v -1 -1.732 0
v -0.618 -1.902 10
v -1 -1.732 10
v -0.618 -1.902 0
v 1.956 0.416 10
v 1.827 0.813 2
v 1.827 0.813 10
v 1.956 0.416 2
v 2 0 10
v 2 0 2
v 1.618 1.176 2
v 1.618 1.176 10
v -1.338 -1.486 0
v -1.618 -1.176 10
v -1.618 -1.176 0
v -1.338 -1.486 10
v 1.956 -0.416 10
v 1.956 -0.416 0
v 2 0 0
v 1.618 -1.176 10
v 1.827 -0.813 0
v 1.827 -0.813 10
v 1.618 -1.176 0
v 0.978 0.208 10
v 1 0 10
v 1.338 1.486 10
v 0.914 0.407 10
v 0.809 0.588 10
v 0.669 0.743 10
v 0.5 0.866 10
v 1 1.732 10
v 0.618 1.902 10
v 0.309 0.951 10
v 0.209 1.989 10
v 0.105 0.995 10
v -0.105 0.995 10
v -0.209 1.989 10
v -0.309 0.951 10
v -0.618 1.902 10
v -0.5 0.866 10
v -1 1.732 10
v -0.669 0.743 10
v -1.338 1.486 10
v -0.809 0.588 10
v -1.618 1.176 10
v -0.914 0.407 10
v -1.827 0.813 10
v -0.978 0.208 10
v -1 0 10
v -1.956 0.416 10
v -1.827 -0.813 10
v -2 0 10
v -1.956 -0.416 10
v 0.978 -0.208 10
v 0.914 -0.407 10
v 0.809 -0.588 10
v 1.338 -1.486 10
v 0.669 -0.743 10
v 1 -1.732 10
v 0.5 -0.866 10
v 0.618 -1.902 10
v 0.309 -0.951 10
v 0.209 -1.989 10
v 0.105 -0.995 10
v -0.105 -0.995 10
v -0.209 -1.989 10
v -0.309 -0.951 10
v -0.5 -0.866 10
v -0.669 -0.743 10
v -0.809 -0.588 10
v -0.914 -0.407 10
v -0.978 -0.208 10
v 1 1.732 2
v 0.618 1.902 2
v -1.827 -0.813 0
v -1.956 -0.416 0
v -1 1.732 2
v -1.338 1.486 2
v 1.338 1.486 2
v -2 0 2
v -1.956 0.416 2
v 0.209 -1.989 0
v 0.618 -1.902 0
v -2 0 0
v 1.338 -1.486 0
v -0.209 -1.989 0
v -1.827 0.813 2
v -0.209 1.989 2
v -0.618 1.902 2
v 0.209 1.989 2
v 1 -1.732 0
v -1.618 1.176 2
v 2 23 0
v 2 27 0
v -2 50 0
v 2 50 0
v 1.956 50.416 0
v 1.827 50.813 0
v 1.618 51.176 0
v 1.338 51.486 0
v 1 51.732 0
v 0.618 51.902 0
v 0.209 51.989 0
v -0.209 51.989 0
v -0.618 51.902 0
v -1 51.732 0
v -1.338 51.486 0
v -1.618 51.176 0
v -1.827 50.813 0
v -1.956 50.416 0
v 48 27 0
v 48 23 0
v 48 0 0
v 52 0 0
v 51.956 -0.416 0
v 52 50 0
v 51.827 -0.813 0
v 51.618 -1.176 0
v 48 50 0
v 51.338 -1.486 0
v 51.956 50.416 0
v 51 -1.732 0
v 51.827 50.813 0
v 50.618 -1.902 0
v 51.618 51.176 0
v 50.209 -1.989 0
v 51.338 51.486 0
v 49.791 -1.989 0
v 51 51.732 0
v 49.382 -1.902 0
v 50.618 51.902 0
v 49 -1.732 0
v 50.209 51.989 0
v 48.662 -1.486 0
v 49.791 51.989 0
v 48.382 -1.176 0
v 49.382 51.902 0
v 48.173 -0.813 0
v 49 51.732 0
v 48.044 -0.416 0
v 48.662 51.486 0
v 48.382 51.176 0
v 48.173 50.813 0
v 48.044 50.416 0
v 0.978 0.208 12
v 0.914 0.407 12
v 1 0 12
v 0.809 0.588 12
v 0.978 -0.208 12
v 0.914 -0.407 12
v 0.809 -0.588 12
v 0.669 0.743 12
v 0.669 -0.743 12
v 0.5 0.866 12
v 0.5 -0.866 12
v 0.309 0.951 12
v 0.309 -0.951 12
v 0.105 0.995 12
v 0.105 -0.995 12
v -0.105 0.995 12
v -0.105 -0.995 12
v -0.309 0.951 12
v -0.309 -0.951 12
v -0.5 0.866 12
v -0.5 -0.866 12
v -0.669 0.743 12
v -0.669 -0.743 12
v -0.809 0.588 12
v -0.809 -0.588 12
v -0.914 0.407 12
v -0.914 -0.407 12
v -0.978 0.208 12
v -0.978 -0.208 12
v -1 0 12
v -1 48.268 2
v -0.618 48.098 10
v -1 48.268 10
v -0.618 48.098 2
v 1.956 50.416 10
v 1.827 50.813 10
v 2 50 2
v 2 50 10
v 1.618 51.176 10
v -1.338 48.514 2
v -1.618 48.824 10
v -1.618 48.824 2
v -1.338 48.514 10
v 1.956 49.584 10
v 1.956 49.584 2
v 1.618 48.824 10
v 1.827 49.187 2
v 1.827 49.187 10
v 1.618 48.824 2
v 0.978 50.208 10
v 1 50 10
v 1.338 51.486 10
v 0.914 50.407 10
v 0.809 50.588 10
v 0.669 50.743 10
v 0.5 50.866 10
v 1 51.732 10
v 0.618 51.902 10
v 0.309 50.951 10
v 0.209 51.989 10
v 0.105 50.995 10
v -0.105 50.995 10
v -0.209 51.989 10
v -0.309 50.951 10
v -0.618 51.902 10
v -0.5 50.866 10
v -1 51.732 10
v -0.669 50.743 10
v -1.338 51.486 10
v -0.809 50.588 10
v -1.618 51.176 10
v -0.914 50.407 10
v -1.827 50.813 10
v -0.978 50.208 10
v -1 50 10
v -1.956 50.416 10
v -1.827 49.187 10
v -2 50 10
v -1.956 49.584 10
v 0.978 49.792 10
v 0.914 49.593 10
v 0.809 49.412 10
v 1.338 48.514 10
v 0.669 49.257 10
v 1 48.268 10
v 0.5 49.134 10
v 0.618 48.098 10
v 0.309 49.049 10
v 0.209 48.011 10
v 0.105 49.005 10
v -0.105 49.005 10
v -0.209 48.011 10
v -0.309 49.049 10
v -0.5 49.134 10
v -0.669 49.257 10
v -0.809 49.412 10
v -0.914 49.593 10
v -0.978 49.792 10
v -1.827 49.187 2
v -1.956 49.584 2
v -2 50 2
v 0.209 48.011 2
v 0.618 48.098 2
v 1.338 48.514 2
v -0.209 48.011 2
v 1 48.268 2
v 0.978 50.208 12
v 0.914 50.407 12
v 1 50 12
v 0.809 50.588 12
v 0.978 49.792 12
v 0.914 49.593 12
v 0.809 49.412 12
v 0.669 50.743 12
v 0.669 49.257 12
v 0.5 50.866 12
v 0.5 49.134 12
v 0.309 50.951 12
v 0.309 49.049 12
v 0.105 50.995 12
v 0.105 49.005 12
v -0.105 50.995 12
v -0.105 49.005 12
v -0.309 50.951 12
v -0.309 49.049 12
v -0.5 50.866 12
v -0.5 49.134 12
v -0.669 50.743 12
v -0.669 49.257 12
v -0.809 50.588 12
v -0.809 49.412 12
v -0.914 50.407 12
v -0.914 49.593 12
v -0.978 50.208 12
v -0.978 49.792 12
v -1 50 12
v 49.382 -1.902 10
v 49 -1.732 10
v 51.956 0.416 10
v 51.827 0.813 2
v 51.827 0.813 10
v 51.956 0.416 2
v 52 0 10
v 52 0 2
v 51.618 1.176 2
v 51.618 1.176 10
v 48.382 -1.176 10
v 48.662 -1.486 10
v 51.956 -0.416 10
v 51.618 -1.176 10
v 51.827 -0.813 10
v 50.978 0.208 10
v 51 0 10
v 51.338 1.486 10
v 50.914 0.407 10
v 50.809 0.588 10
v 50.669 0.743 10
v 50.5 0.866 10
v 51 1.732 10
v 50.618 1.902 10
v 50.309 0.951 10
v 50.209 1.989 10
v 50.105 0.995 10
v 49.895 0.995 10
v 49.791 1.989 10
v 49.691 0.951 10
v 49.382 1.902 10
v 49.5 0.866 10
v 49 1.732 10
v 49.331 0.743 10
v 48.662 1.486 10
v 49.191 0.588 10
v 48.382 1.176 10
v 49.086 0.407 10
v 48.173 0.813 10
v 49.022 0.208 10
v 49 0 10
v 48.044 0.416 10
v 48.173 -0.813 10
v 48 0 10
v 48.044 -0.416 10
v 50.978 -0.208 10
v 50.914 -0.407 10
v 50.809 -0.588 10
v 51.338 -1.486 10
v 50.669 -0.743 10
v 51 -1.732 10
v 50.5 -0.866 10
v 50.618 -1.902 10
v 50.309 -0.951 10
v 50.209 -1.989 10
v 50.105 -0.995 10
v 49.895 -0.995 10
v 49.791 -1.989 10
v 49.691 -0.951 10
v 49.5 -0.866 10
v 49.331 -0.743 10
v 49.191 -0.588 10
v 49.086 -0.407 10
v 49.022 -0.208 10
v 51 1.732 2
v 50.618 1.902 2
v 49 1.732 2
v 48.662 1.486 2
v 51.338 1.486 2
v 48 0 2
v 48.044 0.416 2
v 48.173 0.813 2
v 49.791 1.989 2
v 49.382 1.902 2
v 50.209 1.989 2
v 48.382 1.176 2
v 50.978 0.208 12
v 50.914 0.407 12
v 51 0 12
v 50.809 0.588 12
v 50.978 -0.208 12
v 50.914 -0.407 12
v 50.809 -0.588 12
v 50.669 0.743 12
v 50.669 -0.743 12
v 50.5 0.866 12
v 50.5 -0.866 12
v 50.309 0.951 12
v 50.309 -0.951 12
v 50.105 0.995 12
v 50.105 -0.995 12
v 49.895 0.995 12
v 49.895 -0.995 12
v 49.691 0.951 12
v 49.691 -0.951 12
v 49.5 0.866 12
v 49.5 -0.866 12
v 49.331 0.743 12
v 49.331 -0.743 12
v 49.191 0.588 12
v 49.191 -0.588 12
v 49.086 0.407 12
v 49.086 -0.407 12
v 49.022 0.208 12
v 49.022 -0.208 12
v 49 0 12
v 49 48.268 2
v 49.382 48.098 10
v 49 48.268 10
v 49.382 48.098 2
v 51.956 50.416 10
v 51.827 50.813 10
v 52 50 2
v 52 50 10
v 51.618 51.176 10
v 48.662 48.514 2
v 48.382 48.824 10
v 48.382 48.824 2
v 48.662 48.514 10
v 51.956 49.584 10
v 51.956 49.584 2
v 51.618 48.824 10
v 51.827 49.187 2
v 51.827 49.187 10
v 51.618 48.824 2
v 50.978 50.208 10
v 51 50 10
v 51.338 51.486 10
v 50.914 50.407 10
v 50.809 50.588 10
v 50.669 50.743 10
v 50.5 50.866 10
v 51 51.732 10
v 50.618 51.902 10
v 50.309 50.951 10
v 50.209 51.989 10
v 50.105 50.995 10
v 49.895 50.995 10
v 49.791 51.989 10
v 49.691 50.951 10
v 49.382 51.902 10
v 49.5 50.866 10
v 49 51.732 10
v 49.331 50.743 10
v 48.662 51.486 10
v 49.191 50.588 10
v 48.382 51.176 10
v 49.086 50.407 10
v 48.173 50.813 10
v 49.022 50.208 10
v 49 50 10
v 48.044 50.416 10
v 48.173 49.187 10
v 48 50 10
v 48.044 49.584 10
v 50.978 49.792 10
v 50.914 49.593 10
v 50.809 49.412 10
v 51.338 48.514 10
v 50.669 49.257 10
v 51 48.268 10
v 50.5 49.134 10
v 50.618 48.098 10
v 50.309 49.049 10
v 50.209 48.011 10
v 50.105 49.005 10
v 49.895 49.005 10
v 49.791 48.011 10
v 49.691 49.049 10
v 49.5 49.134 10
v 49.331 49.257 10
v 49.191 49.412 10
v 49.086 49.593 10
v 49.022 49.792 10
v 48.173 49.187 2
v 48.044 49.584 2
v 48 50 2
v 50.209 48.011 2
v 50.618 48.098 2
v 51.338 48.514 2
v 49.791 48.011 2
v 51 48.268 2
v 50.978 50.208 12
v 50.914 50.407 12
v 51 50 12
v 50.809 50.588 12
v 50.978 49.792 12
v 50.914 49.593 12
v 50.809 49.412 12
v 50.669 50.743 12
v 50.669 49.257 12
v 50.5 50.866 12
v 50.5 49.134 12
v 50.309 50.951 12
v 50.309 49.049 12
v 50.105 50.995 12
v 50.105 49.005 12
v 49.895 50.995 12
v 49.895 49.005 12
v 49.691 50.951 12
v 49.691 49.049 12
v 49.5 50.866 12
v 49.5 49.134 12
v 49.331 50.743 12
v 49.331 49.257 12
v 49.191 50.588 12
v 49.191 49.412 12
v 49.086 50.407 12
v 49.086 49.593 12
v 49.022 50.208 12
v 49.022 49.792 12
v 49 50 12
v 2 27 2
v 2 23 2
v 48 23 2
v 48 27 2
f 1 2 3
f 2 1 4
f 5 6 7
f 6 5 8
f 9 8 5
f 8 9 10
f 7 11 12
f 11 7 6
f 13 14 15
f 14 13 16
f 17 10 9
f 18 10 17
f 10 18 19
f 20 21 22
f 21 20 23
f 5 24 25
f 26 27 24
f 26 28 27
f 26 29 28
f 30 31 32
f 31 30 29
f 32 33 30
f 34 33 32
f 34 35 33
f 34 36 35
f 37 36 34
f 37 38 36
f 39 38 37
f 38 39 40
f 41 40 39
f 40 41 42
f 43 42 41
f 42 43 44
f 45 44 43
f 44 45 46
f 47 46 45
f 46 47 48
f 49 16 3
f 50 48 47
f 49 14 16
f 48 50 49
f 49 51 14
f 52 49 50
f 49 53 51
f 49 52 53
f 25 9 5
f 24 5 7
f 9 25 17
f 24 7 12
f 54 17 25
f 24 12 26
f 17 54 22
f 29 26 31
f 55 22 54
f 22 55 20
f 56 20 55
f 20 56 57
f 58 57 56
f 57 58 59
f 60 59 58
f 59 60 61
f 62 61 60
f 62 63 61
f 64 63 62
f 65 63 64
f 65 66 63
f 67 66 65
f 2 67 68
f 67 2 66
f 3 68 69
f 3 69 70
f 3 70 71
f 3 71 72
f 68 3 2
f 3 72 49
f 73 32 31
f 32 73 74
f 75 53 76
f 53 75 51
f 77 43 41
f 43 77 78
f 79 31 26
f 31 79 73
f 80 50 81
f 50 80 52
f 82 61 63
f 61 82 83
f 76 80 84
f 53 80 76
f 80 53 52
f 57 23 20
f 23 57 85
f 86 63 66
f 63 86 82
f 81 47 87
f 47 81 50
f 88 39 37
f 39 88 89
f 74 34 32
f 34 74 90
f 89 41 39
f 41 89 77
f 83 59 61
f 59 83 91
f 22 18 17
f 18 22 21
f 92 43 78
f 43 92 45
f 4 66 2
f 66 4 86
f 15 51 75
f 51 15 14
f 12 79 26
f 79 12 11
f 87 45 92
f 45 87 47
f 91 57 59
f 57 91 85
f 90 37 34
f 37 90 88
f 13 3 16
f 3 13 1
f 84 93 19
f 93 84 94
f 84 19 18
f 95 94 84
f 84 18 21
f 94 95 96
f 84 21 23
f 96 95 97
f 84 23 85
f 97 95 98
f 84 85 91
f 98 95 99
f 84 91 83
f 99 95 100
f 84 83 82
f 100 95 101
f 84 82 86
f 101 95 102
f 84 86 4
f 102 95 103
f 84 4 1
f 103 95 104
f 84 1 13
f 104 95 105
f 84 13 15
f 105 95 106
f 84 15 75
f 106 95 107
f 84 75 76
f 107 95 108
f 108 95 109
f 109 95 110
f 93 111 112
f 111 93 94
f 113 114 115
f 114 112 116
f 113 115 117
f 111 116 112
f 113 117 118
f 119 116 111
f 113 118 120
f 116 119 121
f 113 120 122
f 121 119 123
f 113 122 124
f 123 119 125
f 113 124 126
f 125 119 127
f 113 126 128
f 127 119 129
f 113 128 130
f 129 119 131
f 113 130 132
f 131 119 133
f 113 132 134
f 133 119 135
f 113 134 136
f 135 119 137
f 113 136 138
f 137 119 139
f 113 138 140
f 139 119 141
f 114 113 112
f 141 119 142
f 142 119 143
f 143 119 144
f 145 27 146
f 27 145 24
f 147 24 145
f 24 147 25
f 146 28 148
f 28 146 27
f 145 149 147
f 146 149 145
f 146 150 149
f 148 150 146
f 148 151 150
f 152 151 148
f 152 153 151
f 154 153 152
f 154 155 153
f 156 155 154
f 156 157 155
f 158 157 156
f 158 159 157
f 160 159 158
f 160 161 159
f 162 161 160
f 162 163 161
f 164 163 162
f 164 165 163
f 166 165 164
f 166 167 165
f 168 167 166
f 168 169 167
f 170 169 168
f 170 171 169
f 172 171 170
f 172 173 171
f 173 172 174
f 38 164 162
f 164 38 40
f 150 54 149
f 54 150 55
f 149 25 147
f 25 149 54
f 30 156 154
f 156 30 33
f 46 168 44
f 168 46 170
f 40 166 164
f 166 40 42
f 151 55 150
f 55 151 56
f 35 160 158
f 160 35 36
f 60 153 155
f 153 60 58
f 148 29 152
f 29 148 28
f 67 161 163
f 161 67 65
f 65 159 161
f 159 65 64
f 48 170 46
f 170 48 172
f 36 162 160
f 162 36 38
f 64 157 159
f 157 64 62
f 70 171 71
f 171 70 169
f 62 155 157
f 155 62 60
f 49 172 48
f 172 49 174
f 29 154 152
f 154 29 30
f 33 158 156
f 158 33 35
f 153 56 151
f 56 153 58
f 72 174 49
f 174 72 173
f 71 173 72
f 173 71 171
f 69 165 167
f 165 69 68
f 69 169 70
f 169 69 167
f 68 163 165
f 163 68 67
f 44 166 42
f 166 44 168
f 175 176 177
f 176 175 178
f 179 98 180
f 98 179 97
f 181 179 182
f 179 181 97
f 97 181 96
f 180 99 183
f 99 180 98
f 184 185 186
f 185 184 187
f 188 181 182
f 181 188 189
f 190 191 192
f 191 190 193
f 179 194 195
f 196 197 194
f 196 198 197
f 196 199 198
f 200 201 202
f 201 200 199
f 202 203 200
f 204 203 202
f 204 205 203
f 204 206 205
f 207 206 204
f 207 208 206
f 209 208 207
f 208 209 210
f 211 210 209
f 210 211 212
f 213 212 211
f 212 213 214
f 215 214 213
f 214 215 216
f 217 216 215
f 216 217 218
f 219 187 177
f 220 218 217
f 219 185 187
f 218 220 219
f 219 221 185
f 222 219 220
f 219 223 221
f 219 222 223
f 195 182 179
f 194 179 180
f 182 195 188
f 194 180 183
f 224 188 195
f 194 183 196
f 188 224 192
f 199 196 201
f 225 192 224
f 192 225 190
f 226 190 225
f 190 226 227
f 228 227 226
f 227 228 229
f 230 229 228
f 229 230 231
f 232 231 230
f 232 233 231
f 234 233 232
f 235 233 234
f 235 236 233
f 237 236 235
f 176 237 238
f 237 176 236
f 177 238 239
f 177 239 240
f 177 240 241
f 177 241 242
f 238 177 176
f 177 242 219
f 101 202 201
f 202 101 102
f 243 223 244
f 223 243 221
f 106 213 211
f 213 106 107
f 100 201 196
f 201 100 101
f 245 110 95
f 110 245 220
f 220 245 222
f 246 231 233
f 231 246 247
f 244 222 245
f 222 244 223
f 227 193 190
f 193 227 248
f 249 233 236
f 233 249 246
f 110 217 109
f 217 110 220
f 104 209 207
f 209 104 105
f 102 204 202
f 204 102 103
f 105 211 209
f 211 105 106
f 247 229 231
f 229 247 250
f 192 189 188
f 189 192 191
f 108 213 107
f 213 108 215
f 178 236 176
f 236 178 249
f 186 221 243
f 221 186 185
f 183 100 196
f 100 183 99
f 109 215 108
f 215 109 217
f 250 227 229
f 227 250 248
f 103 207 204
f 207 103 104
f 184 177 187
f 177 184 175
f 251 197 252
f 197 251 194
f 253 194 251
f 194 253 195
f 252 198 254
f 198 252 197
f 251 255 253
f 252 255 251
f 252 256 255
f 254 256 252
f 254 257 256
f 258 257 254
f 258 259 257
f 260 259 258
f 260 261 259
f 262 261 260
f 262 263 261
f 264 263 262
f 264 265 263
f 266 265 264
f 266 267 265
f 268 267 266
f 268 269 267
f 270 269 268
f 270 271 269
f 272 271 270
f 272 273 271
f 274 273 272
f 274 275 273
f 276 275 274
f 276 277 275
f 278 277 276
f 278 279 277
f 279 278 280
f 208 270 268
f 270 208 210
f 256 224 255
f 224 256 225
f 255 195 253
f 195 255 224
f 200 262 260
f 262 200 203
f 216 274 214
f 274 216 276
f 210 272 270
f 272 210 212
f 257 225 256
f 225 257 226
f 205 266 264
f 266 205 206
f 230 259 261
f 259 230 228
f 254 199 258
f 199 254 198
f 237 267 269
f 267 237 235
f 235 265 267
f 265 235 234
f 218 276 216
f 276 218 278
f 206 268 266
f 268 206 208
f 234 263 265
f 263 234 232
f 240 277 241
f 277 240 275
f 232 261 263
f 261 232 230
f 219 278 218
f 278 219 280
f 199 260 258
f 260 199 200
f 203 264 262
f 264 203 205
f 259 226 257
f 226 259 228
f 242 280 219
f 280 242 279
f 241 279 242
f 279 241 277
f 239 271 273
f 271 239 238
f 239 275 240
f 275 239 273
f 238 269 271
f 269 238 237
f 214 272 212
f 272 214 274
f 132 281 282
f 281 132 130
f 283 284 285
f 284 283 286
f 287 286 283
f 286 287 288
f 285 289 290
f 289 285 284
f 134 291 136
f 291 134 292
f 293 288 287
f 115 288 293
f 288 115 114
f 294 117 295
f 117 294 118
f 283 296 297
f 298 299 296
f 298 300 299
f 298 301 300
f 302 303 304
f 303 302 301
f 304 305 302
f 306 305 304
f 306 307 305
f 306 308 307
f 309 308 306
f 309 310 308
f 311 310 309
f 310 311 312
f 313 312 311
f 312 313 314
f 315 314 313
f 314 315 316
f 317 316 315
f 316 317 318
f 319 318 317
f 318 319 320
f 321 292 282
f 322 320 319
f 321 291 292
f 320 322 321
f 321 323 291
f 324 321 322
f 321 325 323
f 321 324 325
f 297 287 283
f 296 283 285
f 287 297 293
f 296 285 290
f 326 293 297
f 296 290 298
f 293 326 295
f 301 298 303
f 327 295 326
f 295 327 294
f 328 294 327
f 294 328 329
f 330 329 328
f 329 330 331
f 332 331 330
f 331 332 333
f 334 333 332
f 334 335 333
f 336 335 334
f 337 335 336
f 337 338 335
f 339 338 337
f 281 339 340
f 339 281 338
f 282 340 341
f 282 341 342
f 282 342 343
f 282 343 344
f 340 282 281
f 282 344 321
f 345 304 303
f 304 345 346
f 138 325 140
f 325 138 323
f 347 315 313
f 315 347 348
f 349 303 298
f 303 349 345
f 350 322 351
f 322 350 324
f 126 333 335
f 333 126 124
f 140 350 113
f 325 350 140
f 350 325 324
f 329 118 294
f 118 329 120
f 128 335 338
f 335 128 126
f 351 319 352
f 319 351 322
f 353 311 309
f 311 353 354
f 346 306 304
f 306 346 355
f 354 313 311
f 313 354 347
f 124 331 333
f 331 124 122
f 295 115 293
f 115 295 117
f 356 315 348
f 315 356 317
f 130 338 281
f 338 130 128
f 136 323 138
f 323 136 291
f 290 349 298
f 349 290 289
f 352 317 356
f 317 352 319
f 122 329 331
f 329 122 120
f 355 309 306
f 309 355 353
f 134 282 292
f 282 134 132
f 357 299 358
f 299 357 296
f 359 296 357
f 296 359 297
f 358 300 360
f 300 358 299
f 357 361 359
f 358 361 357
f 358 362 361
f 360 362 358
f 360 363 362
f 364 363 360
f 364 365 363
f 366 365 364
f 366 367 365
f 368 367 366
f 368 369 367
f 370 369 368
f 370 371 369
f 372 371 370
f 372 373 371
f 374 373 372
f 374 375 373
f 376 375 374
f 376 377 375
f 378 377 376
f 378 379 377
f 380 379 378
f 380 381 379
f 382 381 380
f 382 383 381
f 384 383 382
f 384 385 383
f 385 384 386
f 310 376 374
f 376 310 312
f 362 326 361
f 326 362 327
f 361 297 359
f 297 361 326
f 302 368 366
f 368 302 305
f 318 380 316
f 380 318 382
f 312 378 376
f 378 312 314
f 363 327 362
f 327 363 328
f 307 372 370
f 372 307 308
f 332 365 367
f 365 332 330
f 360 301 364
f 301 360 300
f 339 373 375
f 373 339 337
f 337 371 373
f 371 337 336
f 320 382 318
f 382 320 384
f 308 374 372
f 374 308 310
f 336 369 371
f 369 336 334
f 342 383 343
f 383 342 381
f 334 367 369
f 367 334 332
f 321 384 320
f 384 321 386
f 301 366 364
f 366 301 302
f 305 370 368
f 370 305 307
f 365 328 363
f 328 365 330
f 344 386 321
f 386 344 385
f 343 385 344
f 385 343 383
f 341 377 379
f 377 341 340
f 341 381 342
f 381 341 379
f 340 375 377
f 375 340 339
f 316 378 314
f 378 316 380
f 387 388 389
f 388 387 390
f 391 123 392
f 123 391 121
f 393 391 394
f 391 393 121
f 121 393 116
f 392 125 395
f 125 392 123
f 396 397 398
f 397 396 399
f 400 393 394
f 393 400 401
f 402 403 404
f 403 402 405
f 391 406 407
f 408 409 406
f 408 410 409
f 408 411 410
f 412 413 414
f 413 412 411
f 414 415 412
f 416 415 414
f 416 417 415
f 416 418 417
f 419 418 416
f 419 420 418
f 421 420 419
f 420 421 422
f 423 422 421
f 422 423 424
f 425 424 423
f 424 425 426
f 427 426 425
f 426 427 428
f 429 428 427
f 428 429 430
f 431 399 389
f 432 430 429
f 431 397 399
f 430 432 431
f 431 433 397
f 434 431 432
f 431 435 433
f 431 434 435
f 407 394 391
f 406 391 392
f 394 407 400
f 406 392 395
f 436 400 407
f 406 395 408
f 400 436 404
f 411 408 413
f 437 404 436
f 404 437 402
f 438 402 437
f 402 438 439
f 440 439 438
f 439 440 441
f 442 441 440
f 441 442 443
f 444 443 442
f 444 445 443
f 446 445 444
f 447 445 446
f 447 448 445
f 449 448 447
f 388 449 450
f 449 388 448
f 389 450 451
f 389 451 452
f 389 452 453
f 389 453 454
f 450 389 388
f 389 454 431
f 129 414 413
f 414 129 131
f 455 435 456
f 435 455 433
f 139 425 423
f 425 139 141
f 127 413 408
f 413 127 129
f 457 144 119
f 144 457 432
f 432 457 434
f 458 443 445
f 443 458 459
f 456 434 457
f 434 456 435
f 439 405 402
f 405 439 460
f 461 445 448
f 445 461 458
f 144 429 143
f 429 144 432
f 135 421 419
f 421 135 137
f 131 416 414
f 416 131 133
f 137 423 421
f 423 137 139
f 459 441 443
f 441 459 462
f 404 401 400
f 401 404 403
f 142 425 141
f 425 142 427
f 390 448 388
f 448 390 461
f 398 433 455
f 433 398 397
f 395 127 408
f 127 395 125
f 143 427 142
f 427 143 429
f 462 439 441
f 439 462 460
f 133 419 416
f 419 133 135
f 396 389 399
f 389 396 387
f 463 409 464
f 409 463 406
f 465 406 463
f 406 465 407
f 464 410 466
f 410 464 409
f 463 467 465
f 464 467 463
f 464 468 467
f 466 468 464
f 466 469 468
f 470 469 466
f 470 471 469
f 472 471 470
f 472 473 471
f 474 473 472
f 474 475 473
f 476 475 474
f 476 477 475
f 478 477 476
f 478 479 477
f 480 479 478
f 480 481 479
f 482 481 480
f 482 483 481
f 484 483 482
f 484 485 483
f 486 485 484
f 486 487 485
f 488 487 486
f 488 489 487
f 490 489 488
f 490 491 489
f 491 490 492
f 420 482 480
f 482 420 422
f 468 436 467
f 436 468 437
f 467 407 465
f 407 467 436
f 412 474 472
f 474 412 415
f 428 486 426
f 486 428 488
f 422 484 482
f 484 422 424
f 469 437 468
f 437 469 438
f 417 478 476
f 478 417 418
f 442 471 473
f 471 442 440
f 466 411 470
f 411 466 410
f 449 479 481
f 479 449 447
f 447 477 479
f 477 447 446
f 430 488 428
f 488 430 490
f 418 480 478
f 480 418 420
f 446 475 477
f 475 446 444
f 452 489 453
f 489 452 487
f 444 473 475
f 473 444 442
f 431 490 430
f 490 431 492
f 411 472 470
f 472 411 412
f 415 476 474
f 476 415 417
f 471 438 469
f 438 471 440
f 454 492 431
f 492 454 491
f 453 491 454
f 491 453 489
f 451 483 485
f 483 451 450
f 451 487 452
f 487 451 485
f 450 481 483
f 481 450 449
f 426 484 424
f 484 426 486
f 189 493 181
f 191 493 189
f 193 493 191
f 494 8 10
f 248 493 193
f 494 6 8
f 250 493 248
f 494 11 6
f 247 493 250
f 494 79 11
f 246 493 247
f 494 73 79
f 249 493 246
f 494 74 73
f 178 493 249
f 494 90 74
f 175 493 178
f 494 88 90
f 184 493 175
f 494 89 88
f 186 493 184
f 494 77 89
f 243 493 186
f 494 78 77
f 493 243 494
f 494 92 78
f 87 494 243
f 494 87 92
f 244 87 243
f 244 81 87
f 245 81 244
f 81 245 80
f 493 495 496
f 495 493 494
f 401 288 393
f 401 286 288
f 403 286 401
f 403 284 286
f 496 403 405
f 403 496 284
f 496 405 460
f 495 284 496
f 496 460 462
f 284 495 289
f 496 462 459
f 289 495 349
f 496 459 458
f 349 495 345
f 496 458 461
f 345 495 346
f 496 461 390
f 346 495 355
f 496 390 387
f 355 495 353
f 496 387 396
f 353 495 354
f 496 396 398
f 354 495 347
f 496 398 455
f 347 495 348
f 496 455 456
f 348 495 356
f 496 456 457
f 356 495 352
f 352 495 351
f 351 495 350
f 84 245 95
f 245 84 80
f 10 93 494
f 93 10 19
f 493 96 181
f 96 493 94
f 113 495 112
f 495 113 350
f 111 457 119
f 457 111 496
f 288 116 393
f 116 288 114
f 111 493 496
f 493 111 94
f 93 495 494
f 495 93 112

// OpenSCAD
// file: common.scad
$fs = 0.1;

mm = 1;

intra_board_width = 50 * mm;
inter_board_width = 50 * mm;

link_width = 4 * mm;
link_height = 2 * mm;

standoff_width = 4 * mm;
standoff_height = 10 * mm;

peg_width = 2 * mm;
peg_height = 2 * mm;

total_height = standoff_height + peg_height;

module peg()
{
    cylinder(h = standoff_height, d = standoff_width);
    translate([ 0, 0, standoff_height ]) cylinder(h = peg_height, d = peg_width);
}

module link(length)
{
    translate([ 0, -0.5 * link_width, 0 ]) cube([ length, link_width, link_height ]);
}
// main file
include <common.scad>

module h_link_uncut()
{
    for (i = [ 0, 1 ])
        for (j = [ 0, 1 ])
            translate([ i * intra_board_width, j * inter_board_width ]) peg();

    for (i = [ 0, 1 ])
        translate([ i * intra_board_width, 0, 0 ]) rotate([ 0, 0, 90 ]) link(inter_board_width);

    translate([ 0, 0.5 * inter_board_width, 0 ]) link(intra_board_width);
}

module h_link()
{
    intersection()
    {
        cube([ intra_board_width, inter_board_width, total_height ]);
        h_link_uncut();
    }
}

h_link_uncut();
